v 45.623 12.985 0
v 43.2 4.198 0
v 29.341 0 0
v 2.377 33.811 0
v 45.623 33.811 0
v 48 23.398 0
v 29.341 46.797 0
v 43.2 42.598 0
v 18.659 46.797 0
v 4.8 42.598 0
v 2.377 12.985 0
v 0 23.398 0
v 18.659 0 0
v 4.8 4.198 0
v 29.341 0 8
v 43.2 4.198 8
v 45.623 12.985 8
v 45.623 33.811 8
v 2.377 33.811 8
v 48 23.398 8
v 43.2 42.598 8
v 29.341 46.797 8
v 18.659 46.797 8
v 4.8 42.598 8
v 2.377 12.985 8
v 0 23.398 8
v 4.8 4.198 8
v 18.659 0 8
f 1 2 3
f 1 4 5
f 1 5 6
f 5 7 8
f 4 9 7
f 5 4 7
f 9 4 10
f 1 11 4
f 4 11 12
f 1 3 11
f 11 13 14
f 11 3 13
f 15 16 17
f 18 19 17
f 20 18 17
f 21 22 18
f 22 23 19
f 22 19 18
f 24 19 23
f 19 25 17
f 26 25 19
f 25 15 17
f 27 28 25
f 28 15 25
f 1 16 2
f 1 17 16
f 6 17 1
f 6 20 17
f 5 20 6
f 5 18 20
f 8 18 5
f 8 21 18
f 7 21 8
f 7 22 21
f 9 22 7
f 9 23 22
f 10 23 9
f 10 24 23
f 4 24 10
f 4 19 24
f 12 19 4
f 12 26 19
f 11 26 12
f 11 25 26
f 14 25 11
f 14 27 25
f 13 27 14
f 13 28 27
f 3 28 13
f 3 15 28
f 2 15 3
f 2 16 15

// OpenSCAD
$fn = 32;

// ----------------------------------------------------------------------
// Flat adaptor: hex_disc, 8 mm thick
// ----------------------------------------------------------------------

// --- parameters (mm) ---
profile_height = 8;       // extrusion height
profile_points = 14;      // points of the closed outline

profile = [[0, 23.398], [2.377, 12.985], [4.8, 4.198], [18.659, 0], [29.341, 0], [43.2, 4.198], [45.623, 12.985], [48, 23.398], [45.623, 33.811], [43.2, 42.598], [29.341, 46.797], [18.659, 46.797], [4.8, 42.598], [2.377, 33.811]];  // single closed polygon, 14 points, counter clockwise

// --- the one profile operation ---
linear_extrude(height = profile_height) polygon(points = profile);
